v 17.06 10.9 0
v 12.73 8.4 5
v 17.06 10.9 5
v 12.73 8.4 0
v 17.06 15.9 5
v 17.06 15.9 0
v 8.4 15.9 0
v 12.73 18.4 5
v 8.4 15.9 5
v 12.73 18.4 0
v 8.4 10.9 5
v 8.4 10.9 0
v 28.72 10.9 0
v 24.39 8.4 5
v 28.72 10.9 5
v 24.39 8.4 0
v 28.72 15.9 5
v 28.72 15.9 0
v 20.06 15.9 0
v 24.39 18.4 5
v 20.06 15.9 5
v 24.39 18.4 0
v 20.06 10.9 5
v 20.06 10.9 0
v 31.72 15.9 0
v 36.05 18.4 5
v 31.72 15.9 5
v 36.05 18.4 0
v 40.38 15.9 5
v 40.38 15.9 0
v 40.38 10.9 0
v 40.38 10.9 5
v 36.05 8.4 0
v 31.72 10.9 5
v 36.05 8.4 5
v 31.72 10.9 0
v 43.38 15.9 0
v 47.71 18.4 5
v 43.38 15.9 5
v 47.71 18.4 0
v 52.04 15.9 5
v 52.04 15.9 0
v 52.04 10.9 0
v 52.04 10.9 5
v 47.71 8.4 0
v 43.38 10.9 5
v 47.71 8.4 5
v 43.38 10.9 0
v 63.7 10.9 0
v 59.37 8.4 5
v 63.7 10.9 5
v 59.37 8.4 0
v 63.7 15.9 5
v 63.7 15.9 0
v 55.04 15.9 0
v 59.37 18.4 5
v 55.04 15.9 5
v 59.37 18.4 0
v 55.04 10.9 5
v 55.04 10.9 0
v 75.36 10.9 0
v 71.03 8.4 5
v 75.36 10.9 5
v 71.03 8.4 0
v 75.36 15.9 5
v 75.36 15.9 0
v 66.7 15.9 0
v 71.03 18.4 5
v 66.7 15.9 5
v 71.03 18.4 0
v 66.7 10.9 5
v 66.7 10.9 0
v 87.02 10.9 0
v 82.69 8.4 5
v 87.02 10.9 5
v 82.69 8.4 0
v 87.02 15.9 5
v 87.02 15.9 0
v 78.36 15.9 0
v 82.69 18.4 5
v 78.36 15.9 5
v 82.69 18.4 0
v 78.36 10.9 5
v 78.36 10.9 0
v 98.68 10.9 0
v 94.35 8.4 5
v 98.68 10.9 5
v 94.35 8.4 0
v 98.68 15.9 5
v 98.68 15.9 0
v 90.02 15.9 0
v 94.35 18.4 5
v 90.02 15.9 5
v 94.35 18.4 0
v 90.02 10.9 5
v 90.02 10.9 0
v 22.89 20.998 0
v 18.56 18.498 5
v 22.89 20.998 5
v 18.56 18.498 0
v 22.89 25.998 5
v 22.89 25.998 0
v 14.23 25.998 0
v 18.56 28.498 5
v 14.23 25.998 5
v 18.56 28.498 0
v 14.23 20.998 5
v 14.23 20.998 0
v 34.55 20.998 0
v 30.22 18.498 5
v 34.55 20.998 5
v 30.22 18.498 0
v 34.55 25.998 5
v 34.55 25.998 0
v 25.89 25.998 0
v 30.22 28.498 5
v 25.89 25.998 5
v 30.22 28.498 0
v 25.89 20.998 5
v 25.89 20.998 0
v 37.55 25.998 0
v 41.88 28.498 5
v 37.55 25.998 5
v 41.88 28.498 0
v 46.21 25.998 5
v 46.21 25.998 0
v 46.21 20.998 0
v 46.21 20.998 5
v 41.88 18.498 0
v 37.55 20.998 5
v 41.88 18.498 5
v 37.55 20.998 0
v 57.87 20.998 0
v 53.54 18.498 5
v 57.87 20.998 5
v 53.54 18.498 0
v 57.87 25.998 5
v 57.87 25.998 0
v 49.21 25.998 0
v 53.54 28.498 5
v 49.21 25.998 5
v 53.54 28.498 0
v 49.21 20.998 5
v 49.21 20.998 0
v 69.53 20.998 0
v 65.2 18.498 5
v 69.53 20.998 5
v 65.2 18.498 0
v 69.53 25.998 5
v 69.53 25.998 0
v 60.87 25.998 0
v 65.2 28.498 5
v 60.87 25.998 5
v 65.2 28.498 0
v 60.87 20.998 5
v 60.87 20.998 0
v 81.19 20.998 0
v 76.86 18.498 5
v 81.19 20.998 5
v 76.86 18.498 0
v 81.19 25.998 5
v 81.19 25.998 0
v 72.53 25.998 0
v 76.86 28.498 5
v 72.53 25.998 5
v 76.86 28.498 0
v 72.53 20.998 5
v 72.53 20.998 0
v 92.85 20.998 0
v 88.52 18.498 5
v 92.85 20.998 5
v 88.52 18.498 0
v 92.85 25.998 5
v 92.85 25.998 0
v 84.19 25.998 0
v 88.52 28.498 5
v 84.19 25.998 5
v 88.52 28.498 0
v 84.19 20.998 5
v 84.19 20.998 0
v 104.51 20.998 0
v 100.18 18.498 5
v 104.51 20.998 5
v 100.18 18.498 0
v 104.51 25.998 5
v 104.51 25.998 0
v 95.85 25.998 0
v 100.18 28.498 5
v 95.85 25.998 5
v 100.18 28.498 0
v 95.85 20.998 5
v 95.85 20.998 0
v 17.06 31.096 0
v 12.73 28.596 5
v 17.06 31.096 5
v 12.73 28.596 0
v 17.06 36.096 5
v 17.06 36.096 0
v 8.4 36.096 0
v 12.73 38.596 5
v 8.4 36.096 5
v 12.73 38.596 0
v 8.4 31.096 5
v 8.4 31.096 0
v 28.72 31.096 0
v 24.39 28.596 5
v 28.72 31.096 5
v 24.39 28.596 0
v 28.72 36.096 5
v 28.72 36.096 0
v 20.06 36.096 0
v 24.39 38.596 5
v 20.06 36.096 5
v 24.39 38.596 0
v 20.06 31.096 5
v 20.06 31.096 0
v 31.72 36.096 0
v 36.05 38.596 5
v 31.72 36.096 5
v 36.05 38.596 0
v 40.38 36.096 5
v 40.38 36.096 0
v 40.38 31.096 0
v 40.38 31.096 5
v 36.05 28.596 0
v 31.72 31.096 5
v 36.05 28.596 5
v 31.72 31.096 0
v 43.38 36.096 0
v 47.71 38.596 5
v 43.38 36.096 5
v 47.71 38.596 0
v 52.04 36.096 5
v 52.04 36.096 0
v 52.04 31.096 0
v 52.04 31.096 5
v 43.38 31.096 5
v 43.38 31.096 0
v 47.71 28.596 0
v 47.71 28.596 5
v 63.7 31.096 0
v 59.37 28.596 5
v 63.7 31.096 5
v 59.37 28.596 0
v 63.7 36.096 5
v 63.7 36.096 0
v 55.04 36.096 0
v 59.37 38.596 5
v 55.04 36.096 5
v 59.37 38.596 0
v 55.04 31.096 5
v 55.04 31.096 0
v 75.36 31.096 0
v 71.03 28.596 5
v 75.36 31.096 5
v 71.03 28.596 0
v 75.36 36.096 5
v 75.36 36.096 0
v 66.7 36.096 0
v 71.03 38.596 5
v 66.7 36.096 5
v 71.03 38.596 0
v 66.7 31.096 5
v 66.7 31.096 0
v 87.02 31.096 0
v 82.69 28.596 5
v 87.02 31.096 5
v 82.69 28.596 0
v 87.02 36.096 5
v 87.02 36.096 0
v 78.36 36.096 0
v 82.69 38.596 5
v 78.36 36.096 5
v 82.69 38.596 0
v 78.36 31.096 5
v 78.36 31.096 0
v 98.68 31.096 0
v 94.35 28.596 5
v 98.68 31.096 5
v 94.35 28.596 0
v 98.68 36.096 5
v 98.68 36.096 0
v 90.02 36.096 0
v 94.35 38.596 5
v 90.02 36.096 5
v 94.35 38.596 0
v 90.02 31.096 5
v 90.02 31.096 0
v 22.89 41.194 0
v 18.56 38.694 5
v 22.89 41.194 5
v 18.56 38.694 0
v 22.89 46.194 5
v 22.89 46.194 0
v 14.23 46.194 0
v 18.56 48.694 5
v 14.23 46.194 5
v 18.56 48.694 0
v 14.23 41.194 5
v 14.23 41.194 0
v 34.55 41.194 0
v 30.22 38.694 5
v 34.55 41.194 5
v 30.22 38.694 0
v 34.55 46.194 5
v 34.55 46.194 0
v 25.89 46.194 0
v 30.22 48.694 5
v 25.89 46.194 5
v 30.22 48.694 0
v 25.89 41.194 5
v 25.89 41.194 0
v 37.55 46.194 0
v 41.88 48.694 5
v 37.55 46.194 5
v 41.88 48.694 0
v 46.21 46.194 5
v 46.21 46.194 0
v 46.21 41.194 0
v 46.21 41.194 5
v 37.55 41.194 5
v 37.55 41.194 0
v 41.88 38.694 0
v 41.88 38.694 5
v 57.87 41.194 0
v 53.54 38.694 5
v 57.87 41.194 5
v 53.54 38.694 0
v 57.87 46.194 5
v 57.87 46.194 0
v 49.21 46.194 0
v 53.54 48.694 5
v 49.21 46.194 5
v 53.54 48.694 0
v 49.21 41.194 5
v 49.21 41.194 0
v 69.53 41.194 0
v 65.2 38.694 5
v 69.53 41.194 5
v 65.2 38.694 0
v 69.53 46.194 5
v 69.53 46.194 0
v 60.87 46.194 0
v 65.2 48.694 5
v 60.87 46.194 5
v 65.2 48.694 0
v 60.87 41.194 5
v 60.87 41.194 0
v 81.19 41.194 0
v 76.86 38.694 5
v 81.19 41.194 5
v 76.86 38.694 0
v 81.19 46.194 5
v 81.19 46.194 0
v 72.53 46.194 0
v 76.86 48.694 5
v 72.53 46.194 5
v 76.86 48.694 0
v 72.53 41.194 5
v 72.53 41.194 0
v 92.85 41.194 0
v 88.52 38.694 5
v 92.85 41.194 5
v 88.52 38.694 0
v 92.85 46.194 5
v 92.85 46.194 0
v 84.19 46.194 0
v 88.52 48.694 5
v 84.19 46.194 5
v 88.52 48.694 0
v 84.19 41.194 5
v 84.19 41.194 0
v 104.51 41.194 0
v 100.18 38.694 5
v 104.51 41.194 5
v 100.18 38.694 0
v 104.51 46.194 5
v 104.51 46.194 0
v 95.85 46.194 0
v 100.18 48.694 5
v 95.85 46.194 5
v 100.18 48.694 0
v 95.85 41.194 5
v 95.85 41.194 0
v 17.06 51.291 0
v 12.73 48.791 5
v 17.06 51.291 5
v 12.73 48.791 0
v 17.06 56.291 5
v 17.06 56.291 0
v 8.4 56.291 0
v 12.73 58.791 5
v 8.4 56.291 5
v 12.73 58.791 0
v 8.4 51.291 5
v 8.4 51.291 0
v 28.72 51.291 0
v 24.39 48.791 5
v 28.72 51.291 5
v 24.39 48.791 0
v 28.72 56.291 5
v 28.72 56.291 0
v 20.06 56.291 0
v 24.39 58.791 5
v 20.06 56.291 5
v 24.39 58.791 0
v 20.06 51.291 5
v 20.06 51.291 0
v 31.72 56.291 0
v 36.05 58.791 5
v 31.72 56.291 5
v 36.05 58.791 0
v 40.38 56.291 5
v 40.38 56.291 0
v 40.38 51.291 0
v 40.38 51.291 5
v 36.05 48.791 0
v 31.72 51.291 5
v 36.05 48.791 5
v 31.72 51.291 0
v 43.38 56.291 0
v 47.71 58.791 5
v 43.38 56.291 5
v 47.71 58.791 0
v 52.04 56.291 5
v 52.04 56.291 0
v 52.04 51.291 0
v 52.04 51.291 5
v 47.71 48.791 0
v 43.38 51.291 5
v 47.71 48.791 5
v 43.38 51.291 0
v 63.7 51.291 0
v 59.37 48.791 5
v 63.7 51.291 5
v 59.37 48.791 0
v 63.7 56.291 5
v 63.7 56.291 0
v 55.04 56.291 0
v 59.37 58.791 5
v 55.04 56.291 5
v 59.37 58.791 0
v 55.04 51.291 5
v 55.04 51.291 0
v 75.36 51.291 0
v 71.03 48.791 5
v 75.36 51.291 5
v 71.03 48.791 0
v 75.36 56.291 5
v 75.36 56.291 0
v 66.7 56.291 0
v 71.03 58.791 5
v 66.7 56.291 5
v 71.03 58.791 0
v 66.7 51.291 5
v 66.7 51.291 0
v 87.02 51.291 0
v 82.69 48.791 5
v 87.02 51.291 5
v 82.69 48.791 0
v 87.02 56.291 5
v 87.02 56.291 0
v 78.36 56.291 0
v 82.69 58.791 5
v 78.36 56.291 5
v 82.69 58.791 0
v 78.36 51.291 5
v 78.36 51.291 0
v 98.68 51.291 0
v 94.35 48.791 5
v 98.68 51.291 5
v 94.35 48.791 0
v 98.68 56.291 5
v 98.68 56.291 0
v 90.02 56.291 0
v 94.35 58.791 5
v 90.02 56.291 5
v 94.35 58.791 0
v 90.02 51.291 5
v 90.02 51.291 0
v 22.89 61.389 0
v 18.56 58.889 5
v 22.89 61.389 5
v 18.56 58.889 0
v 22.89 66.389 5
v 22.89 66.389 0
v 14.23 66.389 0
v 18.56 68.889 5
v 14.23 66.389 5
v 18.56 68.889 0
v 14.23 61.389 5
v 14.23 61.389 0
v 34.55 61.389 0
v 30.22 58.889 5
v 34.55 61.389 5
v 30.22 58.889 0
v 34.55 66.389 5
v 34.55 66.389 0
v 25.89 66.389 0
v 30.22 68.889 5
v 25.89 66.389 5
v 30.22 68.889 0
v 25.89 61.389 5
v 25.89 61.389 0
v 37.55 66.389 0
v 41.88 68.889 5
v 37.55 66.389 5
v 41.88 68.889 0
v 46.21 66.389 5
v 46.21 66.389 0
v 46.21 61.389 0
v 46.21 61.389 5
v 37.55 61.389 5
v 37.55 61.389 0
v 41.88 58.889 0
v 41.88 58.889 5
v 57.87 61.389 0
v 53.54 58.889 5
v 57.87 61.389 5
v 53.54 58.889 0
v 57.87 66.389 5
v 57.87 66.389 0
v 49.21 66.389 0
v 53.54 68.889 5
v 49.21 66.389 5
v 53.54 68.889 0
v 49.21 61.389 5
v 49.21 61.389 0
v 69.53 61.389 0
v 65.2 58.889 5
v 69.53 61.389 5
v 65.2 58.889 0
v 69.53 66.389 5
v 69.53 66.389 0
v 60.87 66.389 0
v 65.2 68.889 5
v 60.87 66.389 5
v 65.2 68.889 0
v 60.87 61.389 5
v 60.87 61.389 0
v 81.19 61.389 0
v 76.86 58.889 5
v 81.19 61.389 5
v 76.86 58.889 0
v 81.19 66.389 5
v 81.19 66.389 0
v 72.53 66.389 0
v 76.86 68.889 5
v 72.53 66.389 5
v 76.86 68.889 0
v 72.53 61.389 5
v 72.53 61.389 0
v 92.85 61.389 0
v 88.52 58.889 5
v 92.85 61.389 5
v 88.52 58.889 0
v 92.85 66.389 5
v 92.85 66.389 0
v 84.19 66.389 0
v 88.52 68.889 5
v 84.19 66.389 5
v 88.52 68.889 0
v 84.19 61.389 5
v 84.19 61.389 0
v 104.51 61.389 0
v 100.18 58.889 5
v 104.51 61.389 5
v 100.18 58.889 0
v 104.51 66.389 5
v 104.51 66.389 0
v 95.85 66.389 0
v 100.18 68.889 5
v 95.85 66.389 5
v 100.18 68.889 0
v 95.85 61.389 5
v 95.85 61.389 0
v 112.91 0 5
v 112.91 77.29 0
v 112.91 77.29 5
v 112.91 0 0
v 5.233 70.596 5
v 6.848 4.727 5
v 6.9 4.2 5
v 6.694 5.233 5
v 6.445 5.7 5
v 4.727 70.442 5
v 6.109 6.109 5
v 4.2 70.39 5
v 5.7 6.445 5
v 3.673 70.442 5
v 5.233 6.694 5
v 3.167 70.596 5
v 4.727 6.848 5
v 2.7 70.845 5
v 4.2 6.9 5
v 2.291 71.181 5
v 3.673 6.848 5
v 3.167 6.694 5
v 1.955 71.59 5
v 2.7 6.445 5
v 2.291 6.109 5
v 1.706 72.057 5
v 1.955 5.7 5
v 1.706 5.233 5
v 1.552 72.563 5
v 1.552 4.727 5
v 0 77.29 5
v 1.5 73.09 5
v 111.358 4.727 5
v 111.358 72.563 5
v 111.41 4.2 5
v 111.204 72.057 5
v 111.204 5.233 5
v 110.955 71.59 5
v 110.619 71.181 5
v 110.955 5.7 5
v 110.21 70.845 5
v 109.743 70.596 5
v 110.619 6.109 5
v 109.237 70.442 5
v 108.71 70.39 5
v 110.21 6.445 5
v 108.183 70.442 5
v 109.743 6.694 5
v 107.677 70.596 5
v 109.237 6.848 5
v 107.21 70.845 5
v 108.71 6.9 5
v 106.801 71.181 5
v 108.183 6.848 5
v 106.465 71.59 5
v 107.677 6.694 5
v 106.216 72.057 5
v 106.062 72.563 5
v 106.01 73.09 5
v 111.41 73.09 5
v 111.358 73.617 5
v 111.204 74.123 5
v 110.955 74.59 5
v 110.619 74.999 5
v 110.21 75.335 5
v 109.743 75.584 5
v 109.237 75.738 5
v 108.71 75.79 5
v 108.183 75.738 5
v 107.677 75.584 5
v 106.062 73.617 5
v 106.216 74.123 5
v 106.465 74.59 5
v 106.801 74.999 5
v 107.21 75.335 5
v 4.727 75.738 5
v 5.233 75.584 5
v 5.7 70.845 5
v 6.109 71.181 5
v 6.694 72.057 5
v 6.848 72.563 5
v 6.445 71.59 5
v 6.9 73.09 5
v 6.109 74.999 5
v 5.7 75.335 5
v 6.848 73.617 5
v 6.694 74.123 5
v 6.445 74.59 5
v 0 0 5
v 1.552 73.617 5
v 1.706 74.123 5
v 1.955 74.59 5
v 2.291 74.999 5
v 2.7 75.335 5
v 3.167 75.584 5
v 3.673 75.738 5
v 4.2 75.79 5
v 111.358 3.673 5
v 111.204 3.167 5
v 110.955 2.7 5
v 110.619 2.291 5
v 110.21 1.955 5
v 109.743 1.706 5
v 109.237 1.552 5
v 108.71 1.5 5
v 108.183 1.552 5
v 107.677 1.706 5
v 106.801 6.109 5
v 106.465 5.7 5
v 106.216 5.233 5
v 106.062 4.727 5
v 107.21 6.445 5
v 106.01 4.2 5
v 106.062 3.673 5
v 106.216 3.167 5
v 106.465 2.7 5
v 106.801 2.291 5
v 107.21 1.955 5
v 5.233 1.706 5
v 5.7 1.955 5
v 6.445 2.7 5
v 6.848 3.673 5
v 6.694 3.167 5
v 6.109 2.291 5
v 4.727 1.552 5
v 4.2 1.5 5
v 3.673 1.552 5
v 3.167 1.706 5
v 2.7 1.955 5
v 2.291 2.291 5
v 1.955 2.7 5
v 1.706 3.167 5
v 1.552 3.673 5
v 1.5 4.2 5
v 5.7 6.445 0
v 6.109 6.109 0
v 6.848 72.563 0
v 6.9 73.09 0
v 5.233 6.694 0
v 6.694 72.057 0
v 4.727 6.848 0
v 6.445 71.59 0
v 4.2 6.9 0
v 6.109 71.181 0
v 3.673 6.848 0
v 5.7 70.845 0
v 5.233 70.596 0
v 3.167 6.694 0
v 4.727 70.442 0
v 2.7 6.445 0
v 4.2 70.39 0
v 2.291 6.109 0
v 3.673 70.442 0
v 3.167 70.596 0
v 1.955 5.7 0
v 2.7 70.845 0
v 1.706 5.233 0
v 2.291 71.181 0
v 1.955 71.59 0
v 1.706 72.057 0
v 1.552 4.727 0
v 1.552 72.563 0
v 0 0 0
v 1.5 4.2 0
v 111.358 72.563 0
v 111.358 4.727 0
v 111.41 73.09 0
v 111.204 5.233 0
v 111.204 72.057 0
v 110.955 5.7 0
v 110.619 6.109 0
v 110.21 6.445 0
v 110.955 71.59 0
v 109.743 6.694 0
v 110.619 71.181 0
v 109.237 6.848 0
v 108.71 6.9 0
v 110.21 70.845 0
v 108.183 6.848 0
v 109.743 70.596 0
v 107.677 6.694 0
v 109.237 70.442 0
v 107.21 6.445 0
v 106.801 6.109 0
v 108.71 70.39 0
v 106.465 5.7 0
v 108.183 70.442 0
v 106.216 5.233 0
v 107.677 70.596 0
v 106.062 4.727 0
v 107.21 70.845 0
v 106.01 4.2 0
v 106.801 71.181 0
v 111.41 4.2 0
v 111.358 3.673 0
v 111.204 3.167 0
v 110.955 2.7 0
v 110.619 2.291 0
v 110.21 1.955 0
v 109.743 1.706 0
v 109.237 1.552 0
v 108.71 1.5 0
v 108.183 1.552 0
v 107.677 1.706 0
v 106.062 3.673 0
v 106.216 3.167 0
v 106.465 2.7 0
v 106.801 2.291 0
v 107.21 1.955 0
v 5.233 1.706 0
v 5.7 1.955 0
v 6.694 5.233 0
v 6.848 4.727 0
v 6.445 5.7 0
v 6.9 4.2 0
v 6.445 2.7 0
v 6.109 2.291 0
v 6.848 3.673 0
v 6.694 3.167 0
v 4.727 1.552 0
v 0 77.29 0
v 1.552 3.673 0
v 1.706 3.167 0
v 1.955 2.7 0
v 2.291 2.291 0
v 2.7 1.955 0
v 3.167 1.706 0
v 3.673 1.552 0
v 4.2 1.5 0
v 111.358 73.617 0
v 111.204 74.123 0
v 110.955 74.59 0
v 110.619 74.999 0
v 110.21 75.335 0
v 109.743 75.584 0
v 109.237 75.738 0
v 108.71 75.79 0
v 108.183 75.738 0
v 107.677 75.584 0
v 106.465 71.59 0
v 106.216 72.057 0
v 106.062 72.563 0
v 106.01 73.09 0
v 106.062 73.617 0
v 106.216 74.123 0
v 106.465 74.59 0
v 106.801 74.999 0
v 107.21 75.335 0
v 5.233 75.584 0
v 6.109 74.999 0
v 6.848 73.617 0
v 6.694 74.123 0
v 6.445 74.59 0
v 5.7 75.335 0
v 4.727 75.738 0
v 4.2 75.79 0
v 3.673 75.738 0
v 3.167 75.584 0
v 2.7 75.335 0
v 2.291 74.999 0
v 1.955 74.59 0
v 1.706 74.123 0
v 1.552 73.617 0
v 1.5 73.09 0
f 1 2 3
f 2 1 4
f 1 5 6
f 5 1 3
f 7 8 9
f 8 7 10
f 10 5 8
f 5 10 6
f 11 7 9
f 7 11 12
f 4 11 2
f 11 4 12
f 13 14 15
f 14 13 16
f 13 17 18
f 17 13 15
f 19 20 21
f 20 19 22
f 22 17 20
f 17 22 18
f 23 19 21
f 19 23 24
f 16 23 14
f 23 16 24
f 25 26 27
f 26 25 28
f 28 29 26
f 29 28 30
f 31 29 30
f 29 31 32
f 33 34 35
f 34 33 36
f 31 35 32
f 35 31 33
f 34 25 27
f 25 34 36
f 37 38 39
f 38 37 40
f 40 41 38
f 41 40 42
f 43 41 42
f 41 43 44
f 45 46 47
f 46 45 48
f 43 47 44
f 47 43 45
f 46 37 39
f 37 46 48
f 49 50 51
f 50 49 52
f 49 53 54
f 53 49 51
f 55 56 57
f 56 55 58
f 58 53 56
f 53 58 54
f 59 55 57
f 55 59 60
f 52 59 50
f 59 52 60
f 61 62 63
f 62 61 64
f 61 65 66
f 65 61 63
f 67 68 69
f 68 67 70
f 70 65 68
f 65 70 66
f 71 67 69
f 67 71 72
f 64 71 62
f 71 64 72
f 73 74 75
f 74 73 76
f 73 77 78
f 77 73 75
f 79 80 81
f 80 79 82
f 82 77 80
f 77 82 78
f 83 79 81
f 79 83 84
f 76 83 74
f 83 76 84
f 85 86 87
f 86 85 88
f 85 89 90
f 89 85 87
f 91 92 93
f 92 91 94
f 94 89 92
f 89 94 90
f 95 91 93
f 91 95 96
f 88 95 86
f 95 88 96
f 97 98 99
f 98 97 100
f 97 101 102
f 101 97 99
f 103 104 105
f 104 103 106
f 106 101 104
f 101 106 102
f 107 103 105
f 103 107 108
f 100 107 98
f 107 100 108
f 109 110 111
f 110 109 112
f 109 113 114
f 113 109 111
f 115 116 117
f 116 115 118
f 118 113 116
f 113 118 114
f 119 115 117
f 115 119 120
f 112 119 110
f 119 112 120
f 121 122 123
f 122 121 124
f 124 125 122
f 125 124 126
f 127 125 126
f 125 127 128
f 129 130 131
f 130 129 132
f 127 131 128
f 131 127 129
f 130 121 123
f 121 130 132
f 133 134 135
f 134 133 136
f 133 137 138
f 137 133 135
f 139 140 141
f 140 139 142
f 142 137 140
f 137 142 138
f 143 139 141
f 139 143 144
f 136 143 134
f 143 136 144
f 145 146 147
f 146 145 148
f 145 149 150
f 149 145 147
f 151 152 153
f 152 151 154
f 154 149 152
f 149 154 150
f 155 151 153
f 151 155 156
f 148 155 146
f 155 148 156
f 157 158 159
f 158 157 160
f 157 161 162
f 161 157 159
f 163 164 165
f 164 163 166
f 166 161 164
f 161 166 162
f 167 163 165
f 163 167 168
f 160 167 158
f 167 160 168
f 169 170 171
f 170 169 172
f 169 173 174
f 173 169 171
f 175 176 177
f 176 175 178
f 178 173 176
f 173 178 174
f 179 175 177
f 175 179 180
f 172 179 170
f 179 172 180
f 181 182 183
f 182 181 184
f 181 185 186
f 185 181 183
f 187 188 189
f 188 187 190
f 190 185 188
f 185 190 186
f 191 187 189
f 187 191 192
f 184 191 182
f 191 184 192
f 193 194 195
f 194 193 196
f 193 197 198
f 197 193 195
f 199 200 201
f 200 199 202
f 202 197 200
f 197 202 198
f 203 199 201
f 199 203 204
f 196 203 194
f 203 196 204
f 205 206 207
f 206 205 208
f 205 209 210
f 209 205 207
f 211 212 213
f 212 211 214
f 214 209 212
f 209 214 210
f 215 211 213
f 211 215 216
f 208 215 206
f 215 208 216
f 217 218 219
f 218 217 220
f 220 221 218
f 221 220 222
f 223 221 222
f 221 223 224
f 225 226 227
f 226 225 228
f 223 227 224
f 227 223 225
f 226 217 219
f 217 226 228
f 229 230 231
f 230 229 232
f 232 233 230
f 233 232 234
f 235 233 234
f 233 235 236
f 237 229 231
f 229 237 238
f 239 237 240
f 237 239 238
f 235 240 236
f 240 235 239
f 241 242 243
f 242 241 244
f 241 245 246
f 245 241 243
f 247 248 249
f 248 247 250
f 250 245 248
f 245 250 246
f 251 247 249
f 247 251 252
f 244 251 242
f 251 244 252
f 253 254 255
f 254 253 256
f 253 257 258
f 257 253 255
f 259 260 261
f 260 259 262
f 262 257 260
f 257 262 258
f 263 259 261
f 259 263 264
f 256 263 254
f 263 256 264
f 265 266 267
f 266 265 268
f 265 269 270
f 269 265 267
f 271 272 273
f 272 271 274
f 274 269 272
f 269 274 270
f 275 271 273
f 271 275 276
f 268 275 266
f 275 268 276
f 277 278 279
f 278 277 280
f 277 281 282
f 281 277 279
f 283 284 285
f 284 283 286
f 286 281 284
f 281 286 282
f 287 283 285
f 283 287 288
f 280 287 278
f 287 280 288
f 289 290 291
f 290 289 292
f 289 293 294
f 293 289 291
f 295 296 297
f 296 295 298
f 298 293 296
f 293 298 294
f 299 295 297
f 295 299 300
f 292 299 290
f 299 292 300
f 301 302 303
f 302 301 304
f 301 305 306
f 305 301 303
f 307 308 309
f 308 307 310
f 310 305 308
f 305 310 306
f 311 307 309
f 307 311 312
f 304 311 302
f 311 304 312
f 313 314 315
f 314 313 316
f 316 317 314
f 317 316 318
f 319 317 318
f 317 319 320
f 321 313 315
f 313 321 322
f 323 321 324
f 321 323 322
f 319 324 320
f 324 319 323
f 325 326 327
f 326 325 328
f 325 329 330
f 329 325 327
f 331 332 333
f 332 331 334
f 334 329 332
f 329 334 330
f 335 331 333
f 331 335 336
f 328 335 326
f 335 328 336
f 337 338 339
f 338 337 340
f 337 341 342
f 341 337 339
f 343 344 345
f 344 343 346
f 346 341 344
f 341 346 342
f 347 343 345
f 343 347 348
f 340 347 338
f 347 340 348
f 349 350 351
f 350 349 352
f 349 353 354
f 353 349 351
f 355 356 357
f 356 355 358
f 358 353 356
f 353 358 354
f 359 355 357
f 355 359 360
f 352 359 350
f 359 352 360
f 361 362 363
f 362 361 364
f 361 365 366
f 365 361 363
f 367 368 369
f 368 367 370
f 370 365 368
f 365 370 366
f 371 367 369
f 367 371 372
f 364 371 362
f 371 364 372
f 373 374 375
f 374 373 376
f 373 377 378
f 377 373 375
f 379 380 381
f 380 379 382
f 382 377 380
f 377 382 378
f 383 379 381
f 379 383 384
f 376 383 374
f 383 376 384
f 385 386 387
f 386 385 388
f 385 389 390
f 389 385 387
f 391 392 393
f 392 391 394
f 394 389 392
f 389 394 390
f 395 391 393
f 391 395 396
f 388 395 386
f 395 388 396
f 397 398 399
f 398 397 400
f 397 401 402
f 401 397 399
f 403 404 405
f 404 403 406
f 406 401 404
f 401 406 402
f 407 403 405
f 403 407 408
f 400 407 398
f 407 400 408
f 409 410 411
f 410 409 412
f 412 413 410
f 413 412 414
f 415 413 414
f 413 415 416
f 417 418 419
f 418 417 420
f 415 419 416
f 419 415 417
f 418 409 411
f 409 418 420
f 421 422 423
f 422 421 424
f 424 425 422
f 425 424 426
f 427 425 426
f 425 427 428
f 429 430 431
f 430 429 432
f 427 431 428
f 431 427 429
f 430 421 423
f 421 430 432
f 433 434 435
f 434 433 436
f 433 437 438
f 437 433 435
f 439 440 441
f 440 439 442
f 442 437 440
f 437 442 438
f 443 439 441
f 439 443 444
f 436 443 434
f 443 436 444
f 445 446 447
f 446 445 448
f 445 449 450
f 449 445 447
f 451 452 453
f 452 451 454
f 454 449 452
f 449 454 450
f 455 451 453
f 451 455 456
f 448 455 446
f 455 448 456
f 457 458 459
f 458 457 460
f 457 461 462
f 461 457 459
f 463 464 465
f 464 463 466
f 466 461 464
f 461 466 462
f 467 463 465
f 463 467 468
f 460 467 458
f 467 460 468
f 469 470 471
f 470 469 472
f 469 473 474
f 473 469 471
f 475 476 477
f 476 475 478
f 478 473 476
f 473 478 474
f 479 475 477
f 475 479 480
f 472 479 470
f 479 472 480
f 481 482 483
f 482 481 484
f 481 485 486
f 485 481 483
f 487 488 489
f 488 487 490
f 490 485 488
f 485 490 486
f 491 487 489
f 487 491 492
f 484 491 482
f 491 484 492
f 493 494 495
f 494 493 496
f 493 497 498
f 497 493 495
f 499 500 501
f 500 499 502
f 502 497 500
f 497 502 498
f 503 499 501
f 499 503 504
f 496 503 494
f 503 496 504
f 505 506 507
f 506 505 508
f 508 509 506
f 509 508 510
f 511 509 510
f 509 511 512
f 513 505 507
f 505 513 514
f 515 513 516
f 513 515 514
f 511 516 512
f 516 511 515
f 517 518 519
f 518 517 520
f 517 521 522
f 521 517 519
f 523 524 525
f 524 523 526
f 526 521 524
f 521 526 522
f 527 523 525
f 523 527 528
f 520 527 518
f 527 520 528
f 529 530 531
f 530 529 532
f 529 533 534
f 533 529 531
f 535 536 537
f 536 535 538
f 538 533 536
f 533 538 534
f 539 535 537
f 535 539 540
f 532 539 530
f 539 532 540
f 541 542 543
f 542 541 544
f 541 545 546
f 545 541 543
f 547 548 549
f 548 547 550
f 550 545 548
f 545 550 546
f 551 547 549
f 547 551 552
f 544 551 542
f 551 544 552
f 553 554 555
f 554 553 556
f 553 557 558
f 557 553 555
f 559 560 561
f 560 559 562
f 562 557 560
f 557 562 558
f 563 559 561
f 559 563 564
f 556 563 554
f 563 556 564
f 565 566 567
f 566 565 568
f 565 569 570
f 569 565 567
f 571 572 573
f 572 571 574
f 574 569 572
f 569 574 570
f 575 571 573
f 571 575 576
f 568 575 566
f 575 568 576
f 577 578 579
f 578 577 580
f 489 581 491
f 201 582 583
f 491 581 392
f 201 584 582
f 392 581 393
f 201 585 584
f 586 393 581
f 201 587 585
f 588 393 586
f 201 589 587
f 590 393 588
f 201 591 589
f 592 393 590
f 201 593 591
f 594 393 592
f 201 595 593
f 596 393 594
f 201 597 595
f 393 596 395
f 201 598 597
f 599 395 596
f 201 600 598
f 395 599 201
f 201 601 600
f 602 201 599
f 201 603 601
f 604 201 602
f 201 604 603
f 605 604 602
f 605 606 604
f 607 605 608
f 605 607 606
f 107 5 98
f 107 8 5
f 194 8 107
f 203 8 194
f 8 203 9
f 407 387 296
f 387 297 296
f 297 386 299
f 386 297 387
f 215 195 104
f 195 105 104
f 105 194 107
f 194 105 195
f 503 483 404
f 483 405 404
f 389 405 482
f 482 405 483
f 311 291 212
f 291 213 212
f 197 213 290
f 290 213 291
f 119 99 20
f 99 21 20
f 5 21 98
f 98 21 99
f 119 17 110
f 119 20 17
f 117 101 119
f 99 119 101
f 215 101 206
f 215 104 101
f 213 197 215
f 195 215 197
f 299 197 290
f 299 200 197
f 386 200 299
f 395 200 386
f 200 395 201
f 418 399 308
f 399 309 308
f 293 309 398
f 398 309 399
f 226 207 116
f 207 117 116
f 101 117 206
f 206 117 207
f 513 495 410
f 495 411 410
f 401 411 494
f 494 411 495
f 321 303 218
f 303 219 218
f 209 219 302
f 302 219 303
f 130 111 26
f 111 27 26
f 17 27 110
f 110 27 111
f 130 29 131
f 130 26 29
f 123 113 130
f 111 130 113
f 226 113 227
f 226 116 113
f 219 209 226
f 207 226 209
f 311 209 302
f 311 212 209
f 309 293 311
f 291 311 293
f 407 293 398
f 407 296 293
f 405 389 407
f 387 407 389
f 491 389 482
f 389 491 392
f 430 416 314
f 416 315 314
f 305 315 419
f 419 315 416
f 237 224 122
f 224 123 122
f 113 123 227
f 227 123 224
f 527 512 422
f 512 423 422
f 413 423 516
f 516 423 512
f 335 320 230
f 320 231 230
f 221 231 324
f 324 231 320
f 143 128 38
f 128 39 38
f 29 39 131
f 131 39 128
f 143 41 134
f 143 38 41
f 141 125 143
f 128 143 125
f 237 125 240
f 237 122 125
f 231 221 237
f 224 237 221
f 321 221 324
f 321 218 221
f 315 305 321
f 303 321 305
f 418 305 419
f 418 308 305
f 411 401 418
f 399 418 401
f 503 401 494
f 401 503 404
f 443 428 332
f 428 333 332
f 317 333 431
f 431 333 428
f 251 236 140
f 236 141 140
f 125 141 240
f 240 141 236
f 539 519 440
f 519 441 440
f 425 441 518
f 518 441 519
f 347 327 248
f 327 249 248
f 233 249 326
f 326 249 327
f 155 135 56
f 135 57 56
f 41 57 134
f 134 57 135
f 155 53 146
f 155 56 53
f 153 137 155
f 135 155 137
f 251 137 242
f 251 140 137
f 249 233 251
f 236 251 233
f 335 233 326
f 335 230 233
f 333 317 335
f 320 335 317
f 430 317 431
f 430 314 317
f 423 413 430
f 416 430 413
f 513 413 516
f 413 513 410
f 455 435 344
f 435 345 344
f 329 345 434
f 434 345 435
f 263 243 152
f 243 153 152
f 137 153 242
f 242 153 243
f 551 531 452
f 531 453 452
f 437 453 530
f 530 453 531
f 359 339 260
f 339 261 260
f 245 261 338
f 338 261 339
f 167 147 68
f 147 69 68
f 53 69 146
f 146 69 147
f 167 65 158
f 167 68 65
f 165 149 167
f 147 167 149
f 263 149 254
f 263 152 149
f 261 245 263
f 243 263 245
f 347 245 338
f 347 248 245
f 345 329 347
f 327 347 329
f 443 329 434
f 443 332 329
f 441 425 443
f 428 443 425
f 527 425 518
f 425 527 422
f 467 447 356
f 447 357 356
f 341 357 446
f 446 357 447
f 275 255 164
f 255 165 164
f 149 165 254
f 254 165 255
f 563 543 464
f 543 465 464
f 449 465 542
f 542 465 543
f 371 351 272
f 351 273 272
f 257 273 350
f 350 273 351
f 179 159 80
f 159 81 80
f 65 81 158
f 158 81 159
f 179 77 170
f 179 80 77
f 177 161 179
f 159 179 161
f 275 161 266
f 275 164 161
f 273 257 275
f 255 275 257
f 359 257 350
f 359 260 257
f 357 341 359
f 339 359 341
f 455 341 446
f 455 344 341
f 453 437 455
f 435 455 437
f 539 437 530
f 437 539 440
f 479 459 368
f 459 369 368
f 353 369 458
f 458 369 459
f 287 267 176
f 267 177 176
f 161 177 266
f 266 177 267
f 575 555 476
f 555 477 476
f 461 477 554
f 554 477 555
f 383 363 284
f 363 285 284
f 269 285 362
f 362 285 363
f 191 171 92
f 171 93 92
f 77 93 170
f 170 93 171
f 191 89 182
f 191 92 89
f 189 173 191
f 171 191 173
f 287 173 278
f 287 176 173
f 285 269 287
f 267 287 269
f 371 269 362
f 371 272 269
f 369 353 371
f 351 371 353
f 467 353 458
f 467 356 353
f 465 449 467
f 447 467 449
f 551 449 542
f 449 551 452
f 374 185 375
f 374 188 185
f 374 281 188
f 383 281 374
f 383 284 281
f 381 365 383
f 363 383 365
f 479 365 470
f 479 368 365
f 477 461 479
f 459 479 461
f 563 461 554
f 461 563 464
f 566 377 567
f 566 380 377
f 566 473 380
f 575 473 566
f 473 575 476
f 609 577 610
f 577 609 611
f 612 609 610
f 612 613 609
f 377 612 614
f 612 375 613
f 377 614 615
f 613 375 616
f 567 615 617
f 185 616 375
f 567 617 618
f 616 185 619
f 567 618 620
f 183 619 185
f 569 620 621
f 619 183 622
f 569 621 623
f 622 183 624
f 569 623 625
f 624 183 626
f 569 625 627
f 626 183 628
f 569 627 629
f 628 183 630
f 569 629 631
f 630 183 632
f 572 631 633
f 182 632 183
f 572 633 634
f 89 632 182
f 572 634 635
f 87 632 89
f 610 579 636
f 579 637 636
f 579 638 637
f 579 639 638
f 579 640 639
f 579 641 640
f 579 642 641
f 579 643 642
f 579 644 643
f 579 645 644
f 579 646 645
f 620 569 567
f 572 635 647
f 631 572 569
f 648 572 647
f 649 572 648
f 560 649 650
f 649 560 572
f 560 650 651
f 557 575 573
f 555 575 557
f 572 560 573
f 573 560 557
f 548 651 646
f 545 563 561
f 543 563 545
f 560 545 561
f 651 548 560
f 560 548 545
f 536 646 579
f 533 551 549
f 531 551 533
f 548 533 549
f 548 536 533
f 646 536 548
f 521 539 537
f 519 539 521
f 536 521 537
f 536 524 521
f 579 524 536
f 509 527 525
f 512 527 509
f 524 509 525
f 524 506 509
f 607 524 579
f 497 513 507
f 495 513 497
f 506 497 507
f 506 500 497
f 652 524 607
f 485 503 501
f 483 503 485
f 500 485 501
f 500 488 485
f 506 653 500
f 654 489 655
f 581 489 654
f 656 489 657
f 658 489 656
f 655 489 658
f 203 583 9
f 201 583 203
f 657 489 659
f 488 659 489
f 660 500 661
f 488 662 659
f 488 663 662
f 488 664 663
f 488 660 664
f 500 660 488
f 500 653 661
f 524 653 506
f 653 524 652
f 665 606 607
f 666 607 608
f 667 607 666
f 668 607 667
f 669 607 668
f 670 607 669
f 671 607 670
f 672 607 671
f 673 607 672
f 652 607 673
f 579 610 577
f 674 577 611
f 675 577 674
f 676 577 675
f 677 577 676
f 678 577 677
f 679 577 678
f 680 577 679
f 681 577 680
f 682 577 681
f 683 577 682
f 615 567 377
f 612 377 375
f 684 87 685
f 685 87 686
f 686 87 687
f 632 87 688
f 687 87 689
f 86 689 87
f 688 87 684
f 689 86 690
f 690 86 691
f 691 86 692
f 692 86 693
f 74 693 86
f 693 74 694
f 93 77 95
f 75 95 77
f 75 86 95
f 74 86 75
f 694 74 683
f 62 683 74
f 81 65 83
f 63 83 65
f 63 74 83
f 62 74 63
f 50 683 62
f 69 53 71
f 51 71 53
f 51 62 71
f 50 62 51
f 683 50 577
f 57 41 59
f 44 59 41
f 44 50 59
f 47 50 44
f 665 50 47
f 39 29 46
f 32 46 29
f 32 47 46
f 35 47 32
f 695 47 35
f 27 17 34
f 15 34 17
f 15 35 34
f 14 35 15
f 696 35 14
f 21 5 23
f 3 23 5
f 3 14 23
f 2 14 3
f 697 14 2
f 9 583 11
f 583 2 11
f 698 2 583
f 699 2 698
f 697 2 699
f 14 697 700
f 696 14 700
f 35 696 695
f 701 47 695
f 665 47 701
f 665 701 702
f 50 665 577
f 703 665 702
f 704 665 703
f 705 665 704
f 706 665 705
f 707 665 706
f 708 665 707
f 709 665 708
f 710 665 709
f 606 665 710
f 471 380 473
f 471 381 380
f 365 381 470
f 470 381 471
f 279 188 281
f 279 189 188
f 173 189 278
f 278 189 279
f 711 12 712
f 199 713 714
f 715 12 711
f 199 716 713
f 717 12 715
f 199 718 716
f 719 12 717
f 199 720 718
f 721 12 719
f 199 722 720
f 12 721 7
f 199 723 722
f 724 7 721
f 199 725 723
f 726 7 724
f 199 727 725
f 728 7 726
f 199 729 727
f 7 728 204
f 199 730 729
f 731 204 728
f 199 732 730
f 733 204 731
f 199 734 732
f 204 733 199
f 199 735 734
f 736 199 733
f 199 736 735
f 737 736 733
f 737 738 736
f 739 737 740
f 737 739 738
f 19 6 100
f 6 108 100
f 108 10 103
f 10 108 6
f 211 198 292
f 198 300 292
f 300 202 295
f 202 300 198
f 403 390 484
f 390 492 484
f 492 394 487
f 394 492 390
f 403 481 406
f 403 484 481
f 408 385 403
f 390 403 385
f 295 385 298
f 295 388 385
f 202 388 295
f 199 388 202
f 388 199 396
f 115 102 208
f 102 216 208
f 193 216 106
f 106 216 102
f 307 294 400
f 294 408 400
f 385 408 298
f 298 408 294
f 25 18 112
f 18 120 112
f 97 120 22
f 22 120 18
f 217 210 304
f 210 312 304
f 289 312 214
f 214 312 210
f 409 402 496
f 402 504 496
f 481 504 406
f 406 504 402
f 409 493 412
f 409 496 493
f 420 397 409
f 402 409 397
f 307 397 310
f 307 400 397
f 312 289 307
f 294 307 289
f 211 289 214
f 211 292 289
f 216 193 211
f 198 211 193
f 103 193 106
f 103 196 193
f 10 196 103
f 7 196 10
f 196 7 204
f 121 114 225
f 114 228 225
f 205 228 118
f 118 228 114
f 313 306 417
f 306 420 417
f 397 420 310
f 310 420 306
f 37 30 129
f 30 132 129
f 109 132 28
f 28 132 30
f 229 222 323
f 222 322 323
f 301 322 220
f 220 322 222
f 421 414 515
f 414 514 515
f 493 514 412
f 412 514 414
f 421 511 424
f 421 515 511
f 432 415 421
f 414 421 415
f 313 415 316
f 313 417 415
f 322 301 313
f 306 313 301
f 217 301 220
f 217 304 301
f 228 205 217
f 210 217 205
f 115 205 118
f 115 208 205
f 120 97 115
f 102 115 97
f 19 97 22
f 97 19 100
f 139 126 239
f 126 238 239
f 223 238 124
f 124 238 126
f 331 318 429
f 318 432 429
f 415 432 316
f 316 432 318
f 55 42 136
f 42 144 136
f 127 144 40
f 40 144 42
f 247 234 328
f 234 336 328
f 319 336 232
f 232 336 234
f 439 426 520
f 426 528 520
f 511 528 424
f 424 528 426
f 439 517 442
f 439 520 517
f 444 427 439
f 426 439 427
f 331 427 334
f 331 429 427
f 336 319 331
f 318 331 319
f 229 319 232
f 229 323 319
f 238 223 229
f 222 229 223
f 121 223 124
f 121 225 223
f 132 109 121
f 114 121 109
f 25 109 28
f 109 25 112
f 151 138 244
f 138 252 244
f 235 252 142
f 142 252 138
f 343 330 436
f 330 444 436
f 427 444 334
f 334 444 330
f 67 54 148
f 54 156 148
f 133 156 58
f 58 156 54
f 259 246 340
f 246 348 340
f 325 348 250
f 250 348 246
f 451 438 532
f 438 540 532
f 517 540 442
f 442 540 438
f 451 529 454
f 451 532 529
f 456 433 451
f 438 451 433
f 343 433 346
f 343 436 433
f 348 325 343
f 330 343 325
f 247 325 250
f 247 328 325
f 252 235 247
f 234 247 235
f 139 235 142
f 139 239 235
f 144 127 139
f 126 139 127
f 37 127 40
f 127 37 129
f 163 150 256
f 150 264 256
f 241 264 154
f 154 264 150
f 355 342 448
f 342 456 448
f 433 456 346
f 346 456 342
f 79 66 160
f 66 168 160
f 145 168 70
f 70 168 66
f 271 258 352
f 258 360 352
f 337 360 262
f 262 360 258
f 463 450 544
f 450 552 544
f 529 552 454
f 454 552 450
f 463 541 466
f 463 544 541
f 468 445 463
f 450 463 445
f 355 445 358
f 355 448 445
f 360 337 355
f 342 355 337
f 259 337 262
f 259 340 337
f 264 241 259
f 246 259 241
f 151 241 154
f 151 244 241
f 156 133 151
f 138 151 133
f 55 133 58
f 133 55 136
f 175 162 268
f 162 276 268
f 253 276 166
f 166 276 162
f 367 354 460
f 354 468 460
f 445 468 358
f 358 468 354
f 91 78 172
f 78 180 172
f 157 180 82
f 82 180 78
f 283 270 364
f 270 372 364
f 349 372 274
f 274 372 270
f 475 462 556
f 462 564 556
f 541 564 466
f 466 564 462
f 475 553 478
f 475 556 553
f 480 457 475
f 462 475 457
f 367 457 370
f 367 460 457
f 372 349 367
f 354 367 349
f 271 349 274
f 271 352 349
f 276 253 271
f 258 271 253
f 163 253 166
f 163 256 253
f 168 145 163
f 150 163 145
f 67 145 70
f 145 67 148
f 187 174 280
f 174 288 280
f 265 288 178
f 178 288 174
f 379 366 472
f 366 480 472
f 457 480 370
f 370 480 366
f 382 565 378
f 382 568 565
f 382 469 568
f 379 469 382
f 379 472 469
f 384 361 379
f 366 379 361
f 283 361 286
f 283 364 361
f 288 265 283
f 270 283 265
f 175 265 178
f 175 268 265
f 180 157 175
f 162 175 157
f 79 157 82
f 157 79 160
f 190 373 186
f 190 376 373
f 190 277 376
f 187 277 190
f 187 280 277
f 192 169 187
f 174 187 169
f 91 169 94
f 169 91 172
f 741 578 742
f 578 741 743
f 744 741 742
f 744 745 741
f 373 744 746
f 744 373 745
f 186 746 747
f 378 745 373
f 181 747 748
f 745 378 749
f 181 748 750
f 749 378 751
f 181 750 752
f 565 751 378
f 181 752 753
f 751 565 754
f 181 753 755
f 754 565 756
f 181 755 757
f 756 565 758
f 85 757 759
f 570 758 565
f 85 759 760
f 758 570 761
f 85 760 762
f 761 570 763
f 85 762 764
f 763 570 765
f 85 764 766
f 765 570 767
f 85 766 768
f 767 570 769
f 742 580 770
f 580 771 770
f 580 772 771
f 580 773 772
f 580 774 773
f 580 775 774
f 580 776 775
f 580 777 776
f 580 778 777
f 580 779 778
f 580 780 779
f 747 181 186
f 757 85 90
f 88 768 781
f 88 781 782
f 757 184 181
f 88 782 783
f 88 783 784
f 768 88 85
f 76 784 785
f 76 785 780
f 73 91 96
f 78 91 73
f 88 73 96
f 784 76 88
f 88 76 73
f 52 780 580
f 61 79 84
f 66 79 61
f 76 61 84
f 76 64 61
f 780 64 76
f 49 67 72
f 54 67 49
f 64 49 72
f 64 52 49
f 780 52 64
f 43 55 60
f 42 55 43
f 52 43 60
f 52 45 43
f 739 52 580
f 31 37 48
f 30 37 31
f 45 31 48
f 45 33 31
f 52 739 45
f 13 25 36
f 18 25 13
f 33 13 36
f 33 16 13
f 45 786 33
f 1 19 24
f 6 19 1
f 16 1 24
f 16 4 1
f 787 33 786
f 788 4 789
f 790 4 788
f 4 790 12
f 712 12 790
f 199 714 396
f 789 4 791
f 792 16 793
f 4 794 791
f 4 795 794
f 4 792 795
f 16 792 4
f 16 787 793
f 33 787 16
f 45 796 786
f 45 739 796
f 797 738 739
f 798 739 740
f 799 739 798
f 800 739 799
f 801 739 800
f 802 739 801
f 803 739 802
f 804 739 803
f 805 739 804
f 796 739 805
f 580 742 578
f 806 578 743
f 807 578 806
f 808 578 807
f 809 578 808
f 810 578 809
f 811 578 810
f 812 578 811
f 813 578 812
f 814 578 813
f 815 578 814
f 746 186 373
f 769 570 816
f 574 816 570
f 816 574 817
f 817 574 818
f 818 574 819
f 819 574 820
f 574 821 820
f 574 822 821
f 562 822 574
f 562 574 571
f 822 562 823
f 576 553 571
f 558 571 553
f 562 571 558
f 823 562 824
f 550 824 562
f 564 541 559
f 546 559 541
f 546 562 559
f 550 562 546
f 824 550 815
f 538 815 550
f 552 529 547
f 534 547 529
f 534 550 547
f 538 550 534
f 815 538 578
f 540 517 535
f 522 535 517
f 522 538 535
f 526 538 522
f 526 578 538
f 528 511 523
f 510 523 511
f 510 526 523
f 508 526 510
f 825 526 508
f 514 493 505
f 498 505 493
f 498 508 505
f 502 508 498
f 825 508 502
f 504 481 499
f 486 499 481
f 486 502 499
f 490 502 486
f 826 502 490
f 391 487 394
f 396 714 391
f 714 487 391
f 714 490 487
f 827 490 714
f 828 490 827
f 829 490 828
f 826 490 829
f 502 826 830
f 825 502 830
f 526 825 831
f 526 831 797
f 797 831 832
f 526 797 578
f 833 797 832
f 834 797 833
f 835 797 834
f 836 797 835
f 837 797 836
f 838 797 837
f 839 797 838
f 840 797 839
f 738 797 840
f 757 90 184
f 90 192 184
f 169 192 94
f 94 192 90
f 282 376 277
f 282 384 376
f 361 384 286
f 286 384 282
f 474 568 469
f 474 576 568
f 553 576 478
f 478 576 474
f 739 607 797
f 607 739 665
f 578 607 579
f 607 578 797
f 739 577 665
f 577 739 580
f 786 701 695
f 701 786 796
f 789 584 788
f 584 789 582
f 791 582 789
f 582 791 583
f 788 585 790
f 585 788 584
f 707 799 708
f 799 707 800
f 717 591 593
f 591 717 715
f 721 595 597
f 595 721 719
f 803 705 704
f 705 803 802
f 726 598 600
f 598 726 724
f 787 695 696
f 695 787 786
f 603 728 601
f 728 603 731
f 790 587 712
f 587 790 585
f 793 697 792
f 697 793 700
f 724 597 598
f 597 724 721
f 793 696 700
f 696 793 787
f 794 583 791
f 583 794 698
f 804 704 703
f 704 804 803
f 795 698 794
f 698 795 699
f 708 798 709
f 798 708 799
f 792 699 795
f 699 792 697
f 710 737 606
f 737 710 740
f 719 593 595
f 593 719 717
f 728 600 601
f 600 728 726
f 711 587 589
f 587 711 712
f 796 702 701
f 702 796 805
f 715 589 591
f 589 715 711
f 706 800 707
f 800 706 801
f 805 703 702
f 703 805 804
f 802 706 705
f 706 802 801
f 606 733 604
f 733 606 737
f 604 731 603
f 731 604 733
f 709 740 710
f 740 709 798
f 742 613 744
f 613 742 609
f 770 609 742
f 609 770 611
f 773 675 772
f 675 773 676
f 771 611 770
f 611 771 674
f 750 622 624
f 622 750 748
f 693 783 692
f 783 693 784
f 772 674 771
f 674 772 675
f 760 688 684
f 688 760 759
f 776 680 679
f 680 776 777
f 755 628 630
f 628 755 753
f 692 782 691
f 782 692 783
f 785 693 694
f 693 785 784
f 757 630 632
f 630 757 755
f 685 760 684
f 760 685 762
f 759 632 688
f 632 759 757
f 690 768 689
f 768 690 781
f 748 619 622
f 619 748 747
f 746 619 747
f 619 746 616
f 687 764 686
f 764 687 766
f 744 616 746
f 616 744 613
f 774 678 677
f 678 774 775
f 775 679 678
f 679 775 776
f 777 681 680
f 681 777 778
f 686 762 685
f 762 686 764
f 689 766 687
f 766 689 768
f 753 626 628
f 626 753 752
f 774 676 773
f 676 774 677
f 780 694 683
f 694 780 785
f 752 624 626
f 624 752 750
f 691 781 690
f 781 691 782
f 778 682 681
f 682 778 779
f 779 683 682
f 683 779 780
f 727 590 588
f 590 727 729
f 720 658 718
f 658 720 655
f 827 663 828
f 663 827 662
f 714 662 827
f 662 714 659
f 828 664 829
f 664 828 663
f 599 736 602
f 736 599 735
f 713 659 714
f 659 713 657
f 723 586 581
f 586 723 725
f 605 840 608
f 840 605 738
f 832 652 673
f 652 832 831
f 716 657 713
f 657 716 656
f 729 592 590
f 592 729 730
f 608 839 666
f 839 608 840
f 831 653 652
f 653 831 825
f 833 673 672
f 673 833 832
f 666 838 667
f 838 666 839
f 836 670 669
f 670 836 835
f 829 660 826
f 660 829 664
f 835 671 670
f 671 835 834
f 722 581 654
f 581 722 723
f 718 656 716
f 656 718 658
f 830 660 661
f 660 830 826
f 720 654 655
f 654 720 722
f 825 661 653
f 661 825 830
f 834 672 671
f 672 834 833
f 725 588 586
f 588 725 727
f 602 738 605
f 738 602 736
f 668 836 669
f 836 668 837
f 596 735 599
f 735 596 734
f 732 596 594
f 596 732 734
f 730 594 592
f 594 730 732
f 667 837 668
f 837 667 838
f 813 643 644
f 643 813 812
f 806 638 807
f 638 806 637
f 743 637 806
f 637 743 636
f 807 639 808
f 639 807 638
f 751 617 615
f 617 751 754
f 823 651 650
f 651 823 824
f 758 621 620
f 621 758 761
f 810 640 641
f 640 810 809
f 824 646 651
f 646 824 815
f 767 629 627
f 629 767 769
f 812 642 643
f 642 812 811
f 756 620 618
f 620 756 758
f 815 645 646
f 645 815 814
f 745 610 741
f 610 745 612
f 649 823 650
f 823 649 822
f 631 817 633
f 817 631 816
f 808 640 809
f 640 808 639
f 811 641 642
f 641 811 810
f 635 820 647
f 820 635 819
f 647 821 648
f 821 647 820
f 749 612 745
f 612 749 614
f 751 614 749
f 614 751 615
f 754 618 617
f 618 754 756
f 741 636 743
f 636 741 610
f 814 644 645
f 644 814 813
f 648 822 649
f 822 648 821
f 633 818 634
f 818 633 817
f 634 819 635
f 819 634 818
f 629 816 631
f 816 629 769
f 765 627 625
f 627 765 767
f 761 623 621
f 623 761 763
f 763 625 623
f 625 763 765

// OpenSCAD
$fn = 32;

// ----------------------------------------------------------------------
// Honeycomb panel: 112.91 x 77.29 mm, 48 cells of 10 mm
// ----------------------------------------------------------------------

// --- parameters (mm) ---
panel_w = 112.91;         // panel width
panel_d = 77.29;          // panel depth
thick = 5;                // panel thickness
cell_r = 5;               // hex cell circumradius
pitch = 11.66;            // hex cell pitch (centre to centre)
web = 3;                  // web between the cells
columns = 8;              // columns of cells
rows = 6;                 // rows of cells
cell_count = 48;          // total cells
shift_x = 12.73;          // first cell offset in x
shift_y = 13.4;           // first cell offset in y
mount_d = 5.4;            // corner mounting holes
hole_off = 4.2;           // mounting hole offset from the corners

difference() {
  union() {
    cube([panel_w, panel_d, thick]);
  }
  /* hexagonal cells, point-up, cut right through the plate */
  for (row = [0 : rows - 1]) {
    for (col = [0 : columns - 1]) {
      translate([shift_x + col * pitch + (row % 2) * pitch / 2, shift_y + row * pitch * 0.866025, -2.5]) rotate([0, 0, 30]) cylinder(h = thick + 5, d = 2 * cell_r, $fn = 6);
    }
  }
  /* corner mounting holes, clear of the outer cell web */
  translate([4.2, 4.2, -2.5]) cylinder(h = thick + 5, d = mount_d);
  translate([108.71, 4.2, -2.5]) cylinder(h = thick + 5, d = mount_d);
  translate([4.2, 73.09, -2.5]) cylinder(h = thick + 5, d = mount_d);
  translate([108.71, 73.09, -2.5]) cylinder(h = thick + 5, d = mount_d);
}
